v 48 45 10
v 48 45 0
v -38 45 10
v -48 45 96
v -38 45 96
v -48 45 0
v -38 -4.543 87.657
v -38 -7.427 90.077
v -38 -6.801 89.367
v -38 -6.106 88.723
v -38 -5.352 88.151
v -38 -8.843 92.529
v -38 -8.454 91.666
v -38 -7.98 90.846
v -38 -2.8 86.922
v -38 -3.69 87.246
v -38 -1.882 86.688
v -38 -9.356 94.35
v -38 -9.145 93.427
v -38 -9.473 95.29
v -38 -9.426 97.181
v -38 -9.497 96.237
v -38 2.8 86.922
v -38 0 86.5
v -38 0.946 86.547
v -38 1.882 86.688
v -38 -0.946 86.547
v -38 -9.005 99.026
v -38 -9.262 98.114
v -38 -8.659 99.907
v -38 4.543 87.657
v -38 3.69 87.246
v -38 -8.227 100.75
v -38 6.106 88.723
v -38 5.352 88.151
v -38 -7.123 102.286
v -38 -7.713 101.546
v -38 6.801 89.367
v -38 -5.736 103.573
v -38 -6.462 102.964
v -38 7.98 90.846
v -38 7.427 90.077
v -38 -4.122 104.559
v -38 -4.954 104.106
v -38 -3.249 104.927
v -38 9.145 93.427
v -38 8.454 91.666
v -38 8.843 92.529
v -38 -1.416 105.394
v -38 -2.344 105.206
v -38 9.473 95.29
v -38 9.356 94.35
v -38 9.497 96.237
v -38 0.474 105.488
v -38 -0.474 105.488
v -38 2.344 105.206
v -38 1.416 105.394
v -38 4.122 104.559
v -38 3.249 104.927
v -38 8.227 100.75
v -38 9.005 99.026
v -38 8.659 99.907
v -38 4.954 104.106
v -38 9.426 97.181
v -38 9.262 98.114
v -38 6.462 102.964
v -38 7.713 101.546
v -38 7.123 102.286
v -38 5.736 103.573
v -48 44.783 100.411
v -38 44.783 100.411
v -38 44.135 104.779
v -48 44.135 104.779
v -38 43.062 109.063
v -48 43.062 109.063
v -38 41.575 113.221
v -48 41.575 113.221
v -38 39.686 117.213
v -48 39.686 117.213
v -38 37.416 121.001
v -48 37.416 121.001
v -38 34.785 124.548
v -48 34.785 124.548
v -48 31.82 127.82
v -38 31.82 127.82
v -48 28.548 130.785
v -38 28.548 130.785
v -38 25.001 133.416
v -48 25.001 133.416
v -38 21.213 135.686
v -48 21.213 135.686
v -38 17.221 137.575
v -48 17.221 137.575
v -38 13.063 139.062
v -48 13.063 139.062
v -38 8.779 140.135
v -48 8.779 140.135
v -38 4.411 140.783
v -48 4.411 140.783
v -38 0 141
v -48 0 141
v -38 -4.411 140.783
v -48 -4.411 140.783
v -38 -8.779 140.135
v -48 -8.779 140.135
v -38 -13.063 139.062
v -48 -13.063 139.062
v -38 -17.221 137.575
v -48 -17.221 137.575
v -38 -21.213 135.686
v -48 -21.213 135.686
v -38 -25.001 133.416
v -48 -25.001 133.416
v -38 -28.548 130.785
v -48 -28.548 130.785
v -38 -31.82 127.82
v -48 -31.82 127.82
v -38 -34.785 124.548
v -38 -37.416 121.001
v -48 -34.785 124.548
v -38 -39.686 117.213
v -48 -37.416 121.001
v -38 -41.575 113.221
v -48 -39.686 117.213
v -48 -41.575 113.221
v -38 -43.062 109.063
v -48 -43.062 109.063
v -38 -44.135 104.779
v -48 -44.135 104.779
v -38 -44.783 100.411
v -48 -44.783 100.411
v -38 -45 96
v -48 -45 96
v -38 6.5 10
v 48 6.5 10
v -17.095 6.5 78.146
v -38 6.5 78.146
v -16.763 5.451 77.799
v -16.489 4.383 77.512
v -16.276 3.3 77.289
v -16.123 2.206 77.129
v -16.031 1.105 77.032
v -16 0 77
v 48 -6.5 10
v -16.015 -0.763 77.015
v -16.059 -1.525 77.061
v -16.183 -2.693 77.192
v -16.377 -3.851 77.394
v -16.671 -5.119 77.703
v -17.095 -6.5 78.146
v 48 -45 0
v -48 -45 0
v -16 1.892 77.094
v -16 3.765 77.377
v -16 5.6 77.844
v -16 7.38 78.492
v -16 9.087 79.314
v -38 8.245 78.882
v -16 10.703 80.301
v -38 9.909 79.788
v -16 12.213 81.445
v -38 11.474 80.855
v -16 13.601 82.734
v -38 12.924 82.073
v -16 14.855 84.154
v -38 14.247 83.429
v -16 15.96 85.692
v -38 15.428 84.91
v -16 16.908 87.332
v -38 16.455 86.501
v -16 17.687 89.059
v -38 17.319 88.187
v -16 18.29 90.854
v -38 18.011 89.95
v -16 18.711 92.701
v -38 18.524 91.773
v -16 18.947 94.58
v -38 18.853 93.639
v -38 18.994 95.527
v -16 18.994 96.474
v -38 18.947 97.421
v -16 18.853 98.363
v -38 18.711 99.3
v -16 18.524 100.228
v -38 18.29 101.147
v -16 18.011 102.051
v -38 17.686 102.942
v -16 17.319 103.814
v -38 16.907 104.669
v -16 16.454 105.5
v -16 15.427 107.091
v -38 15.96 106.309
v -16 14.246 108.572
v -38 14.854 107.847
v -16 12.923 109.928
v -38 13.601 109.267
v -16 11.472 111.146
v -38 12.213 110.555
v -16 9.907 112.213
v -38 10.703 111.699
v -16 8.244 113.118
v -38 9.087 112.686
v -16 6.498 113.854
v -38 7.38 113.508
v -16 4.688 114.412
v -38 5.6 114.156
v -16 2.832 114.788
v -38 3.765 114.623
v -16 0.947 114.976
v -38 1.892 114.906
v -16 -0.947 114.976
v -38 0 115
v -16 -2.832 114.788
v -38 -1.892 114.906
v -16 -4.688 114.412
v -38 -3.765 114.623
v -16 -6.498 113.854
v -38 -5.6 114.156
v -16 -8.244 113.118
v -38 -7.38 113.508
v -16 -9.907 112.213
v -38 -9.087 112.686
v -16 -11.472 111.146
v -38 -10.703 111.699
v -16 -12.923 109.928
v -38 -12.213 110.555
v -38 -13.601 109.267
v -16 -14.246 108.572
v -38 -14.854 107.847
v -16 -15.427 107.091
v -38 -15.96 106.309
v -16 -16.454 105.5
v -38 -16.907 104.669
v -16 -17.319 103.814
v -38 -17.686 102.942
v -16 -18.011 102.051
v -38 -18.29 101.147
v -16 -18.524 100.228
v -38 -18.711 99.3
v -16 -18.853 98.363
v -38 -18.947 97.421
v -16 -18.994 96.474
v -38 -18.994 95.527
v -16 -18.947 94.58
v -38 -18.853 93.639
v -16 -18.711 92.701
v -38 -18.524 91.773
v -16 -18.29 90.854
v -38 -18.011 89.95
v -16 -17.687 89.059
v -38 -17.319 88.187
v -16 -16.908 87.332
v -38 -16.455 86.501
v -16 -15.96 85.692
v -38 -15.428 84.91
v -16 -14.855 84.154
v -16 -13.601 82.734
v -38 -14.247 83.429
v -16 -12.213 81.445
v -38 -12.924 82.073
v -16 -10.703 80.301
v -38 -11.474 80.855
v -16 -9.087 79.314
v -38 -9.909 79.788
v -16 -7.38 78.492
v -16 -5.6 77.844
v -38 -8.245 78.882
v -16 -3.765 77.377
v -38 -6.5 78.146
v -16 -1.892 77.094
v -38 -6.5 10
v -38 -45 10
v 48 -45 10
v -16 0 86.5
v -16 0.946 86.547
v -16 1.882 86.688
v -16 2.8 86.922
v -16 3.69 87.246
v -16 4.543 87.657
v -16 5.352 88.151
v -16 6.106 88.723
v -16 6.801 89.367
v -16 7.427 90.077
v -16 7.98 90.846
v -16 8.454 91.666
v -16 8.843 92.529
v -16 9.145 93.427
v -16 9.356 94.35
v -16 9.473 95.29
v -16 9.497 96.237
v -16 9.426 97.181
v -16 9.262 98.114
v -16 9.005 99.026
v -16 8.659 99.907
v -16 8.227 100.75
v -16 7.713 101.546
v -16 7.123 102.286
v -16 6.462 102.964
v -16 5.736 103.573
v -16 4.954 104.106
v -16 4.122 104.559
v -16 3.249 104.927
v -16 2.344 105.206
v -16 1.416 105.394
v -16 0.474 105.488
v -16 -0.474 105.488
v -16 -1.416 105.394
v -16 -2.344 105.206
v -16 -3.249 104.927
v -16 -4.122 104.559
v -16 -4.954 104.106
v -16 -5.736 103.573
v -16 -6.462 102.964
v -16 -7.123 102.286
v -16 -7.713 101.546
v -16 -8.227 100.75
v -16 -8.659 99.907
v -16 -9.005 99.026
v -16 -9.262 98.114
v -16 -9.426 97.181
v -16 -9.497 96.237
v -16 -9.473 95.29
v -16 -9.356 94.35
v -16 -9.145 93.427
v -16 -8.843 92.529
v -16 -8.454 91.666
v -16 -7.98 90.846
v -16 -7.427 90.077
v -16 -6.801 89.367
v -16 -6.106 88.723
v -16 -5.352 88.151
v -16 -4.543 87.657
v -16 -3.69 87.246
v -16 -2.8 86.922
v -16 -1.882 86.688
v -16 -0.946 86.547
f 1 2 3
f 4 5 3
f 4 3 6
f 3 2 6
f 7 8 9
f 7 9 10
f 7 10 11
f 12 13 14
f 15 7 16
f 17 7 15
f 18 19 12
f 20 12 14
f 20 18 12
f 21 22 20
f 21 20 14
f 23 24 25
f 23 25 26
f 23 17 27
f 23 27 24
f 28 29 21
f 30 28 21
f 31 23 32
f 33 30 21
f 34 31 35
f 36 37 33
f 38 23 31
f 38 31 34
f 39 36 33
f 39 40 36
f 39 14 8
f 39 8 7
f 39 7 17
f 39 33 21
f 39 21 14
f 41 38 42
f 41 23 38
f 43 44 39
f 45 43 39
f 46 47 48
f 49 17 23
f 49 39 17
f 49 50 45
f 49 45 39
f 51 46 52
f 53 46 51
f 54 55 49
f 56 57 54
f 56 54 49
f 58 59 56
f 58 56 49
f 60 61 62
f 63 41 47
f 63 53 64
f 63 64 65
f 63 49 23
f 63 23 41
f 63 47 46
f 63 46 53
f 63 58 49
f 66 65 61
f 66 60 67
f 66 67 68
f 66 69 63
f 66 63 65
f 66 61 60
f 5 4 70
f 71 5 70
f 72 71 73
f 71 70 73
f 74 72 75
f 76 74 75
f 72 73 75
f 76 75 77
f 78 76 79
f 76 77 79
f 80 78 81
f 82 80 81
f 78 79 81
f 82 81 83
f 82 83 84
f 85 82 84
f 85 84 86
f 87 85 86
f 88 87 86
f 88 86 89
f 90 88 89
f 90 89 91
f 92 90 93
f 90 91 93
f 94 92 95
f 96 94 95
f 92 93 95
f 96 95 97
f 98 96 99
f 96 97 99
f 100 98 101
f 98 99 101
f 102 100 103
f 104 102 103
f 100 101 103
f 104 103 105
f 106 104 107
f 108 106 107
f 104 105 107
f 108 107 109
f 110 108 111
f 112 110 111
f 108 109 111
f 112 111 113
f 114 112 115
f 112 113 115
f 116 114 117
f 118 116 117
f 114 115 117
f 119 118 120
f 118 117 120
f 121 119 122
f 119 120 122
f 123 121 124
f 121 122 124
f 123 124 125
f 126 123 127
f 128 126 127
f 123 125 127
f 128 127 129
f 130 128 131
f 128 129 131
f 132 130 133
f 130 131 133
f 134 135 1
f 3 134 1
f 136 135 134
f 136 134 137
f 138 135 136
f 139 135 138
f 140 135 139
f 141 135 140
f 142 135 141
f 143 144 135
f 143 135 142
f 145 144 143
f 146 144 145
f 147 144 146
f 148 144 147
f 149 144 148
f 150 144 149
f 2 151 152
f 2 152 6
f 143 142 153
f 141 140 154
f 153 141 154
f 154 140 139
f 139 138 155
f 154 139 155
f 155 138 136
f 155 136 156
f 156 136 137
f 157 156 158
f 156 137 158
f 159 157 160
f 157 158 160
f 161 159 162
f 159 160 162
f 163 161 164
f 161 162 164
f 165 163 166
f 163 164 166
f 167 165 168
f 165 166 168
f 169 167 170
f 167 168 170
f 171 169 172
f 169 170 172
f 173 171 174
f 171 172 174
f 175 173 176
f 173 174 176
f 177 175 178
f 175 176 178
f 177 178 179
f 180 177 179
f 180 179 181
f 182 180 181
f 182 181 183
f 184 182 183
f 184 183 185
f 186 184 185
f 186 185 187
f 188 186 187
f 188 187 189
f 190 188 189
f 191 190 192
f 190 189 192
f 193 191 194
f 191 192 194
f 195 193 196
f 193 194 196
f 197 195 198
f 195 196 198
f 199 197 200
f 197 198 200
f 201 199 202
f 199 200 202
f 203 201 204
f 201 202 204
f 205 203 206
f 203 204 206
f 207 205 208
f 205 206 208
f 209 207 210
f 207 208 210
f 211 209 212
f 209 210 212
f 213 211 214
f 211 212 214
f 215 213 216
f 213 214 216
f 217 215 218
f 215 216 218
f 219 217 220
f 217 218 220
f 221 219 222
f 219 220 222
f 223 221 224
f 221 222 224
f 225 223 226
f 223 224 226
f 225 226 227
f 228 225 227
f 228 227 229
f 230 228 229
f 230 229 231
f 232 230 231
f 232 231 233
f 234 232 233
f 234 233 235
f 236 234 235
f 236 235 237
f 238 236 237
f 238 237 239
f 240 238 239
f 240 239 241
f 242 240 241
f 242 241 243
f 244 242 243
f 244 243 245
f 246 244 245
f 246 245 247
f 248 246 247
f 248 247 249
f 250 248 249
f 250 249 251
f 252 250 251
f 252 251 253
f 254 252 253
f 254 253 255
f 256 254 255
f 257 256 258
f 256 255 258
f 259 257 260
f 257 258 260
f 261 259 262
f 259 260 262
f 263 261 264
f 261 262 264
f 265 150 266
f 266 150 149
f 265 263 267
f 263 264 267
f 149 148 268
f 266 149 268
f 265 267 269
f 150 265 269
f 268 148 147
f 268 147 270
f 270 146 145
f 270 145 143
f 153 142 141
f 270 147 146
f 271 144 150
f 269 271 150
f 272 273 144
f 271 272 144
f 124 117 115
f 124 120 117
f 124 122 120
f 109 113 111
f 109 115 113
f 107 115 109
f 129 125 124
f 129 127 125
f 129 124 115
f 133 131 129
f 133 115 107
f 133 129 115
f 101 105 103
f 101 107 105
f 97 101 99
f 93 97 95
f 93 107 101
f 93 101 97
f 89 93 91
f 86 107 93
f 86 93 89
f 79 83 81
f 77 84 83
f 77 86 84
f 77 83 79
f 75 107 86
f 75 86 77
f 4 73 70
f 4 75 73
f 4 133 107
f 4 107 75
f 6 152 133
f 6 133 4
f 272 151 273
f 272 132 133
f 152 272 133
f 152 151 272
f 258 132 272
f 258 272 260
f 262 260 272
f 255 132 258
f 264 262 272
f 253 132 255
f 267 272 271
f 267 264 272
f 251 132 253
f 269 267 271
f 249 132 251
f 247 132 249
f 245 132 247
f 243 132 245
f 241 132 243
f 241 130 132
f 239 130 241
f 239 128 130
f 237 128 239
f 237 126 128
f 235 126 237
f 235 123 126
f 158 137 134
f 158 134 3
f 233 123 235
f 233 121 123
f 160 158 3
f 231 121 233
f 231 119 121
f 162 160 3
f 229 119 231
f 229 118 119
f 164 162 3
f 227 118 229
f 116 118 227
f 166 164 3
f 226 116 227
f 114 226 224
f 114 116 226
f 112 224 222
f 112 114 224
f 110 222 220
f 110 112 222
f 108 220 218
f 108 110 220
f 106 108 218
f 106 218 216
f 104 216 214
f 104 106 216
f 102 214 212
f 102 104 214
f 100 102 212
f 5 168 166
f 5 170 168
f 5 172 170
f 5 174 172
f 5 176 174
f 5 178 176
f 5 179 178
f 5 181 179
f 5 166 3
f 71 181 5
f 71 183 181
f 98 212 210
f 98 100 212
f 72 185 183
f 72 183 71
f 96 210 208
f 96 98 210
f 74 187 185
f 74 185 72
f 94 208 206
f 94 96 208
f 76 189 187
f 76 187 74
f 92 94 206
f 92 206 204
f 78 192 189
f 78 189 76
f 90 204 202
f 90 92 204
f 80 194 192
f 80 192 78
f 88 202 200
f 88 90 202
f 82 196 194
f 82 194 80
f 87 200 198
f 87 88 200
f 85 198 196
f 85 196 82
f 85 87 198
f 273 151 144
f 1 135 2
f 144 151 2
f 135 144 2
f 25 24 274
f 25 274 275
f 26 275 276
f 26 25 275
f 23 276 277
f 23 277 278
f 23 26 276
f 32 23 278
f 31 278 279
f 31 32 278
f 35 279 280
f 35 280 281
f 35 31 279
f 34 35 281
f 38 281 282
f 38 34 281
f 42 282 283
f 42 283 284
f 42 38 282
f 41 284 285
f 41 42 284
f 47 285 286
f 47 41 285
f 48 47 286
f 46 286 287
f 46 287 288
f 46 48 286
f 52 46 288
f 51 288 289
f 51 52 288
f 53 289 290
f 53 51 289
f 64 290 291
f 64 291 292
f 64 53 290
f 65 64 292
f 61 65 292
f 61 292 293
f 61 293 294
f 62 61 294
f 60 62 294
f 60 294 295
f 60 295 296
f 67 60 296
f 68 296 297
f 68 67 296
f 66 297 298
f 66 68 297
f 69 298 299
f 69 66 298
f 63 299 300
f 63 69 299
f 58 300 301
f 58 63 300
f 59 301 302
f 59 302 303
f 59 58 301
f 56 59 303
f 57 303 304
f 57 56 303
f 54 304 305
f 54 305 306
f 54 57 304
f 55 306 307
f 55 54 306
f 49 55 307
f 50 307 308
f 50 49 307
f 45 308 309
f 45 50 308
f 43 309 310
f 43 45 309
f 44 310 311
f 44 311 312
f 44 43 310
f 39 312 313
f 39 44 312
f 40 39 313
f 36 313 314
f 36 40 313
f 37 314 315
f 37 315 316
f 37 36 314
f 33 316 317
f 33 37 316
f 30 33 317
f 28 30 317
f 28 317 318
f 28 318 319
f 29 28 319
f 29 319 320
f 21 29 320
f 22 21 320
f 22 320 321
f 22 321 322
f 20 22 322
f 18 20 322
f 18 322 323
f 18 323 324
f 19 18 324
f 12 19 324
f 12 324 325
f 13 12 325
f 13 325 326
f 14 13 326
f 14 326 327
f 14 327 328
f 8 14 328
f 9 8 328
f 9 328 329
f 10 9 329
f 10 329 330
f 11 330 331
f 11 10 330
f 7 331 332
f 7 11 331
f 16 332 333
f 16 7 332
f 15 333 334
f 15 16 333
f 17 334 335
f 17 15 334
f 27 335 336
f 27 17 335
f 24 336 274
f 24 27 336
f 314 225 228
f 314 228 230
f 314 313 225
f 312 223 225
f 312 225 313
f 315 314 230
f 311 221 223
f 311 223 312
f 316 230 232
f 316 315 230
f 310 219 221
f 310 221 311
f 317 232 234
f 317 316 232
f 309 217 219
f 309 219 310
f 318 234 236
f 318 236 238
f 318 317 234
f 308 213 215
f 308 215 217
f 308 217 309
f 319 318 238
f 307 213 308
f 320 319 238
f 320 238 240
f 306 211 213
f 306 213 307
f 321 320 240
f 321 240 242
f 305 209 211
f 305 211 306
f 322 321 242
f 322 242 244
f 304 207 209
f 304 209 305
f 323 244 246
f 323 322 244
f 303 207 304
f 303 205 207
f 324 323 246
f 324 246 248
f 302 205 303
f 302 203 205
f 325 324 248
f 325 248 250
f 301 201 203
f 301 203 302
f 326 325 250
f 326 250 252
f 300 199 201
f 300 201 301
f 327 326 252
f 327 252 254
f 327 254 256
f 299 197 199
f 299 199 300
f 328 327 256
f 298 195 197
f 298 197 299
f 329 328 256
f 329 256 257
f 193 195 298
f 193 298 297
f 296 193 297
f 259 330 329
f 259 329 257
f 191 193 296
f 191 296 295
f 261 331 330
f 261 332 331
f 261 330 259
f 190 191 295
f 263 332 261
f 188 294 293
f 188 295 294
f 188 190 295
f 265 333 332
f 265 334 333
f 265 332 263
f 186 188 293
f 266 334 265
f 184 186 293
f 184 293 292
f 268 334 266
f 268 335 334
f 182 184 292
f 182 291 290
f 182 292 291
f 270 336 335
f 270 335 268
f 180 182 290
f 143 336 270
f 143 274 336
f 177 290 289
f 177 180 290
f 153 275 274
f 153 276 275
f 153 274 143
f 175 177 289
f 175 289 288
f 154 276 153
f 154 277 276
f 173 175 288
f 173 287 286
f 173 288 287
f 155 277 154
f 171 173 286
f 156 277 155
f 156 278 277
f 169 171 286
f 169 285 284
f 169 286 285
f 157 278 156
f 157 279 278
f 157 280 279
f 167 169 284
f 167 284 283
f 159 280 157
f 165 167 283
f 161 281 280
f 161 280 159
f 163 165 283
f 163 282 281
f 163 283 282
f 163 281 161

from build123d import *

# Parameters (mm, degrees)
SKETCH1_W           = 90
SKETCH1_H           = 96
BOSS_EXTRUDE1_DEPTH = 10
BOSS_EXTRUDE2_DEPTH = 10
SKETCH3_R           = 19
SKETCH3_R_2         = 9.5
BOSS_EXTRUDE3_DEPTH = 22
RIB1_REACH          = 157.596
SKETCH4_WALL_W      = 405.846534596
SKETCH4_WALL_H      = 13


with BuildPart() as part:
    # Sketch1 → Boss-Extrude1 (new body)
    with BuildSketch(Plane(origin=(0, 0, 0), x_dir=(0, 1, 0), z_dir=(0, 0, 1))):
        Rectangle(SKETCH1_W, SKETCH1_H)
    extrude(amount=BOSS_EXTRUDE1_DEPTH)

    # Sketch2 → Boss-Extrude2 (add)
    with BuildSketch(Plane(origin=(-48, 0, 0), x_dir=(0, -1, 0), z_dir=(-1, 0, 0))):
        with BuildLine():
            Line((-45, 0), (-45, 96))
            ThreePointArc((-45, 96), (0, 141), (45, 96))
            Line((45, 96), (45, 0))
            Line((45, 0), (-45, 0))
        make_face()
    extrude(amount=-BOSS_EXTRUDE2_DEPTH)

    # Sketch3 → Boss-Extrude3 (add)
    with BuildSketch(Plane.YZ.offset(-38)):
        with Locations(Location((0, 96, 0), (0, 0, 270))):
            Circle(SKETCH3_R)
        with Locations(Location((0, 96, 0), (0, 0, 270))):
            Circle(SKETCH3_R_2, mode=Mode.SUBTRACT)
    extrude(amount=BOSS_EXTRUDE3_DEPTH)

    # Sketch4 wall → Rib1 (add, up to next)
    with BuildSketch(Plane(origin=(16, 0, 43.5), x_dir=(-0.6907323943, 0, 0.723110475283), z_dir=(0.723110475283, 0, 0.6907323943)), mode=Mode.PRIVATE) as rib1_sk1:
        Rectangle(SKETCH4_WALL_W, SKETCH4_WALL_H)
    rib1_tool1 = extrude(rib1_sk1.sketch, amount=-RIB1_REACH, mode=Mode.PRIVATE) - part.part
    add(rib1_tool1.solids().sort_by_distance((16, 0, 43.5))[0])


solid = part.part
